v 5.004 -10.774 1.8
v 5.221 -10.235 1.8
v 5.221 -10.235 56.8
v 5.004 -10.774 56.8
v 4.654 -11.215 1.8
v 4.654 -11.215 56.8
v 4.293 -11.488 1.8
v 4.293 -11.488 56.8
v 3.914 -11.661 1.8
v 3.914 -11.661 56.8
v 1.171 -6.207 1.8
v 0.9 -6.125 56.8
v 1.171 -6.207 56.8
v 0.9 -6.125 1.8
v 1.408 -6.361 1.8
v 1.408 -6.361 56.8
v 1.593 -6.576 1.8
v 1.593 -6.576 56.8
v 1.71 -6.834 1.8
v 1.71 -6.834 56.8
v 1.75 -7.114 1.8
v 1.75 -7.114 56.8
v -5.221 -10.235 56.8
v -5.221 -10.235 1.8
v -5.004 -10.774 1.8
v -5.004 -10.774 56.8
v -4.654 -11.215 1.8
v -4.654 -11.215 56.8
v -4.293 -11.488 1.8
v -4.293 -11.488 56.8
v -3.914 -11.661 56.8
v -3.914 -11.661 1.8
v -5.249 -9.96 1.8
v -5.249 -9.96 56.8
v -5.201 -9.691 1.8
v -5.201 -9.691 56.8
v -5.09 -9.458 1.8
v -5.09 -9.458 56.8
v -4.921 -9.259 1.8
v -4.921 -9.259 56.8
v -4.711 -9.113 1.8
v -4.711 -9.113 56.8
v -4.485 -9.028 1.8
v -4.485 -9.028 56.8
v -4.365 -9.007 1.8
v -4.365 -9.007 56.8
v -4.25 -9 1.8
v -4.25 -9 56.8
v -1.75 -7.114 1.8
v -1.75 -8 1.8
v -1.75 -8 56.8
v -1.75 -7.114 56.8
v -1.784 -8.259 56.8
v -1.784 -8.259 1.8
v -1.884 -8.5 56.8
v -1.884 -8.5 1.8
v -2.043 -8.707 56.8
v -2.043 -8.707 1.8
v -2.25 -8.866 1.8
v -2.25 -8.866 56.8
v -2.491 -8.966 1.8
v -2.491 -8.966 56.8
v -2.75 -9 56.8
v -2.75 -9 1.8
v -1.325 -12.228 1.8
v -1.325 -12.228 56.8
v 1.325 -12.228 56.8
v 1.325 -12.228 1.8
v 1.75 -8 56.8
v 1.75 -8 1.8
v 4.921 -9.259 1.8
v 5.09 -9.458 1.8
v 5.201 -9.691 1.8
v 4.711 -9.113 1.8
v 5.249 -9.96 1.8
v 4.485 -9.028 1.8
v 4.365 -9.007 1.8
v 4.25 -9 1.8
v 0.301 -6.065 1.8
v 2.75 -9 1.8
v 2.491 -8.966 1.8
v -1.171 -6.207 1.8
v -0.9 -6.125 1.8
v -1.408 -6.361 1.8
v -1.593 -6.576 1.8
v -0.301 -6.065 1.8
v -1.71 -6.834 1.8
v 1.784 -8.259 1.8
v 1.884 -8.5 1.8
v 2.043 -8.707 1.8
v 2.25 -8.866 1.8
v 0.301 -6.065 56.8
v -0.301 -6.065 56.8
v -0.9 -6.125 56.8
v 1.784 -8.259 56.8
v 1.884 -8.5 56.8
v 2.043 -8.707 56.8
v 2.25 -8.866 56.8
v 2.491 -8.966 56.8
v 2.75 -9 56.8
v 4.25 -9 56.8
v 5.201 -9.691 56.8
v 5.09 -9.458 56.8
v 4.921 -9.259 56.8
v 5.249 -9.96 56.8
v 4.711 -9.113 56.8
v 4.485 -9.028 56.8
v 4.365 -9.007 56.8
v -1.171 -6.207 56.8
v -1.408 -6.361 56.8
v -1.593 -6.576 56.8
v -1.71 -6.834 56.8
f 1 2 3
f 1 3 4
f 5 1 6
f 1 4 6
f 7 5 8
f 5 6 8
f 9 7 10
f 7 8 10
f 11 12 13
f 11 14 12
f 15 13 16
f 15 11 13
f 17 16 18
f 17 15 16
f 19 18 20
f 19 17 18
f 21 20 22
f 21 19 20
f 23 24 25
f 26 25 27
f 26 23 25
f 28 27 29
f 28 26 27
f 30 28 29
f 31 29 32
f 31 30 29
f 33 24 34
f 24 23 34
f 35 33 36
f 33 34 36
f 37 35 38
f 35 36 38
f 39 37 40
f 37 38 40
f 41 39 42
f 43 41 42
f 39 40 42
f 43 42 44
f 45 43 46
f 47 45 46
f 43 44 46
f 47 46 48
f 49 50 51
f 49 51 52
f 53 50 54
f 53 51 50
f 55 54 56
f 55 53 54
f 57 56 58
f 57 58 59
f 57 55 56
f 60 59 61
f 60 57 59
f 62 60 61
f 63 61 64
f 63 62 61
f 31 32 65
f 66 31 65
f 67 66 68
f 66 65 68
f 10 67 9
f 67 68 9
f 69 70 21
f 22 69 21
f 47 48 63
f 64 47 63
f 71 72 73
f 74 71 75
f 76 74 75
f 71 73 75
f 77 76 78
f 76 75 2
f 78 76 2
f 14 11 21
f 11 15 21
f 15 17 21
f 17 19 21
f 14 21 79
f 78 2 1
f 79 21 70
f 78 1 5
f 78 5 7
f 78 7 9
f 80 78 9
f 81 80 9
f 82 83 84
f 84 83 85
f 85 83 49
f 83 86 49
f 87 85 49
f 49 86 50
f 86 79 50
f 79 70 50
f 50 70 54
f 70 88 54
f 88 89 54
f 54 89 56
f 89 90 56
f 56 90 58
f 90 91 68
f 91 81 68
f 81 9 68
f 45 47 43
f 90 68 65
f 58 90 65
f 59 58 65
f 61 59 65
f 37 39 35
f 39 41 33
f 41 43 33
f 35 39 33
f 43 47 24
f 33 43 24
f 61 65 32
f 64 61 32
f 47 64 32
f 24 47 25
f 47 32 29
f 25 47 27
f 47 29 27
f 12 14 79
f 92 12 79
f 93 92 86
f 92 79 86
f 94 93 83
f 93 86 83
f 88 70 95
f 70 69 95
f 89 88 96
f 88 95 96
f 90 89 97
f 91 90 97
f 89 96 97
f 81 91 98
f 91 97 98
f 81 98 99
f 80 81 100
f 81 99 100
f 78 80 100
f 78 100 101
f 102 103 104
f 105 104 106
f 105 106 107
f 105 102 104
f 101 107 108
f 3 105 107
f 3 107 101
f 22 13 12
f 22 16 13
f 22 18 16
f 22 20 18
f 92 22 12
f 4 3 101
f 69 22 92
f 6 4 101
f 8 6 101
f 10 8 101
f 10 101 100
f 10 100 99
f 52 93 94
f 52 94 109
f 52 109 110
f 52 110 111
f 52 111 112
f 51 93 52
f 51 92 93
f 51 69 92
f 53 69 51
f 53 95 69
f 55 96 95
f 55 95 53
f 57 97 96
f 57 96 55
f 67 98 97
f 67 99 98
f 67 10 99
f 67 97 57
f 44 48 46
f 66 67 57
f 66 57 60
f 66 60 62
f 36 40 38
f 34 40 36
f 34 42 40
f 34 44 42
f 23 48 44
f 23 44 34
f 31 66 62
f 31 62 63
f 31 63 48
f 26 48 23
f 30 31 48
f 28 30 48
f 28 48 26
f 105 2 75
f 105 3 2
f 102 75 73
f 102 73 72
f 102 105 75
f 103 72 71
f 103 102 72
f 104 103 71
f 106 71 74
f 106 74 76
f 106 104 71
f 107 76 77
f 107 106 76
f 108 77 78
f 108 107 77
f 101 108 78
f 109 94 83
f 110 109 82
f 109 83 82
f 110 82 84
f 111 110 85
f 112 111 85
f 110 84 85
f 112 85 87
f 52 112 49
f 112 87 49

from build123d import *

# Parameters (mm, degrees)
BOX004_W                   = 3.5
BOX004_H                   = 3
BOX004_DEPTH               = 60
BOX003_W                   = 3.5
BOX003_H                   = 3
BOX003_DEPTH               = 60
EXTRUDE009_DEPTH           = 55
EXTRUDE009_PLACEMENT_ANGLE = 180
FILLET004_R                = 2
FILLET005_R                = 1


with BuildPart() as cubo_derecho_para_diferencia:
    # Box004 → Box004 (new body)
    with BuildSketch(Plane(origin=(1.75, -9, 0), x_dir=(1, 0, 0), z_dir=(0, 0, 1))):
        with Locations((1.75, 1.5)):
            Rectangle(BOX004_W, BOX004_H)
    extrude(amount=BOX004_DEPTH)


with BuildPart() as cubo_izquierdo_para_diferencia:
    # Box003 → Box003 (new body)
    with BuildSketch(Plane(origin=(-5.25, -9, 0), x_dir=(1, 0, 0), z_dir=(0, 0, 1))):
        with Locations((1.75, 1.5)):
            Rectangle(BOX003_W, BOX003_H)
    extrude(amount=BOX003_DEPTH)


with BuildPart() as barrote_final:
    # Sketch007 → Extrude009 (new body)
    with BuildSketch(Plane.XY):
        with BuildLine():
            ThreePointArc((-5.868808, 10.809583), (0, 6.057418), (5.868808, 10.809583))
            ThreePointArc((5.868808, 10.809583), (0, 12.3), (-5.868808, 10.809583))
        make_face()
    extrude(amount=EXTRUDE009_DEPTH)


with BuildPart() as barrote_final_1:
    # Extrude009 placement: moved
    add(barrote_final.part.moved(Location((0, 0, 1.8))).rotate(Axis((0, 0, 1.8), (0, 0, 1)), EXTRUDE009_PLACEMENT_ANGLE))

    # Fillet004
    fillet004_edges = [barrote_final_1.edges().sort_by_distance(p)[0] for p in [
        (5.868808, -10.809583, 29.3),
        (-5.868808, -10.809583, 29.3),
    ]]
    fillet(fillet004_edges, radius=FILLET004_R)

    # Cut002: cut Cubo izquierdo para diferencia
    add(cubo_izquierdo_para_diferencia.part, mode=Mode.SUBTRACT)

    # Cut003: cut Cubo derecho para diferencia
    add(cubo_derecho_para_diferencia.part, mode=Mode.SUBTRACT)

    # Fillet005
    fillet005_edges = [barrote_final_1.edges().sort_by_distance(p)[0] for p in [
        (-1.75, -6.318298, 29.3),
        (1.75, -6.318298, 29.3),
        (-1.75, -9, 29.3),
        (1.75, -9, 29.3),
        (5.125721, -9, 29.3),
        (-5.125721, -9, 29.3),
    ]]
    fillet(fillet005_edges, radius=FILLET005_R)


solid = barrote_final_1.part
